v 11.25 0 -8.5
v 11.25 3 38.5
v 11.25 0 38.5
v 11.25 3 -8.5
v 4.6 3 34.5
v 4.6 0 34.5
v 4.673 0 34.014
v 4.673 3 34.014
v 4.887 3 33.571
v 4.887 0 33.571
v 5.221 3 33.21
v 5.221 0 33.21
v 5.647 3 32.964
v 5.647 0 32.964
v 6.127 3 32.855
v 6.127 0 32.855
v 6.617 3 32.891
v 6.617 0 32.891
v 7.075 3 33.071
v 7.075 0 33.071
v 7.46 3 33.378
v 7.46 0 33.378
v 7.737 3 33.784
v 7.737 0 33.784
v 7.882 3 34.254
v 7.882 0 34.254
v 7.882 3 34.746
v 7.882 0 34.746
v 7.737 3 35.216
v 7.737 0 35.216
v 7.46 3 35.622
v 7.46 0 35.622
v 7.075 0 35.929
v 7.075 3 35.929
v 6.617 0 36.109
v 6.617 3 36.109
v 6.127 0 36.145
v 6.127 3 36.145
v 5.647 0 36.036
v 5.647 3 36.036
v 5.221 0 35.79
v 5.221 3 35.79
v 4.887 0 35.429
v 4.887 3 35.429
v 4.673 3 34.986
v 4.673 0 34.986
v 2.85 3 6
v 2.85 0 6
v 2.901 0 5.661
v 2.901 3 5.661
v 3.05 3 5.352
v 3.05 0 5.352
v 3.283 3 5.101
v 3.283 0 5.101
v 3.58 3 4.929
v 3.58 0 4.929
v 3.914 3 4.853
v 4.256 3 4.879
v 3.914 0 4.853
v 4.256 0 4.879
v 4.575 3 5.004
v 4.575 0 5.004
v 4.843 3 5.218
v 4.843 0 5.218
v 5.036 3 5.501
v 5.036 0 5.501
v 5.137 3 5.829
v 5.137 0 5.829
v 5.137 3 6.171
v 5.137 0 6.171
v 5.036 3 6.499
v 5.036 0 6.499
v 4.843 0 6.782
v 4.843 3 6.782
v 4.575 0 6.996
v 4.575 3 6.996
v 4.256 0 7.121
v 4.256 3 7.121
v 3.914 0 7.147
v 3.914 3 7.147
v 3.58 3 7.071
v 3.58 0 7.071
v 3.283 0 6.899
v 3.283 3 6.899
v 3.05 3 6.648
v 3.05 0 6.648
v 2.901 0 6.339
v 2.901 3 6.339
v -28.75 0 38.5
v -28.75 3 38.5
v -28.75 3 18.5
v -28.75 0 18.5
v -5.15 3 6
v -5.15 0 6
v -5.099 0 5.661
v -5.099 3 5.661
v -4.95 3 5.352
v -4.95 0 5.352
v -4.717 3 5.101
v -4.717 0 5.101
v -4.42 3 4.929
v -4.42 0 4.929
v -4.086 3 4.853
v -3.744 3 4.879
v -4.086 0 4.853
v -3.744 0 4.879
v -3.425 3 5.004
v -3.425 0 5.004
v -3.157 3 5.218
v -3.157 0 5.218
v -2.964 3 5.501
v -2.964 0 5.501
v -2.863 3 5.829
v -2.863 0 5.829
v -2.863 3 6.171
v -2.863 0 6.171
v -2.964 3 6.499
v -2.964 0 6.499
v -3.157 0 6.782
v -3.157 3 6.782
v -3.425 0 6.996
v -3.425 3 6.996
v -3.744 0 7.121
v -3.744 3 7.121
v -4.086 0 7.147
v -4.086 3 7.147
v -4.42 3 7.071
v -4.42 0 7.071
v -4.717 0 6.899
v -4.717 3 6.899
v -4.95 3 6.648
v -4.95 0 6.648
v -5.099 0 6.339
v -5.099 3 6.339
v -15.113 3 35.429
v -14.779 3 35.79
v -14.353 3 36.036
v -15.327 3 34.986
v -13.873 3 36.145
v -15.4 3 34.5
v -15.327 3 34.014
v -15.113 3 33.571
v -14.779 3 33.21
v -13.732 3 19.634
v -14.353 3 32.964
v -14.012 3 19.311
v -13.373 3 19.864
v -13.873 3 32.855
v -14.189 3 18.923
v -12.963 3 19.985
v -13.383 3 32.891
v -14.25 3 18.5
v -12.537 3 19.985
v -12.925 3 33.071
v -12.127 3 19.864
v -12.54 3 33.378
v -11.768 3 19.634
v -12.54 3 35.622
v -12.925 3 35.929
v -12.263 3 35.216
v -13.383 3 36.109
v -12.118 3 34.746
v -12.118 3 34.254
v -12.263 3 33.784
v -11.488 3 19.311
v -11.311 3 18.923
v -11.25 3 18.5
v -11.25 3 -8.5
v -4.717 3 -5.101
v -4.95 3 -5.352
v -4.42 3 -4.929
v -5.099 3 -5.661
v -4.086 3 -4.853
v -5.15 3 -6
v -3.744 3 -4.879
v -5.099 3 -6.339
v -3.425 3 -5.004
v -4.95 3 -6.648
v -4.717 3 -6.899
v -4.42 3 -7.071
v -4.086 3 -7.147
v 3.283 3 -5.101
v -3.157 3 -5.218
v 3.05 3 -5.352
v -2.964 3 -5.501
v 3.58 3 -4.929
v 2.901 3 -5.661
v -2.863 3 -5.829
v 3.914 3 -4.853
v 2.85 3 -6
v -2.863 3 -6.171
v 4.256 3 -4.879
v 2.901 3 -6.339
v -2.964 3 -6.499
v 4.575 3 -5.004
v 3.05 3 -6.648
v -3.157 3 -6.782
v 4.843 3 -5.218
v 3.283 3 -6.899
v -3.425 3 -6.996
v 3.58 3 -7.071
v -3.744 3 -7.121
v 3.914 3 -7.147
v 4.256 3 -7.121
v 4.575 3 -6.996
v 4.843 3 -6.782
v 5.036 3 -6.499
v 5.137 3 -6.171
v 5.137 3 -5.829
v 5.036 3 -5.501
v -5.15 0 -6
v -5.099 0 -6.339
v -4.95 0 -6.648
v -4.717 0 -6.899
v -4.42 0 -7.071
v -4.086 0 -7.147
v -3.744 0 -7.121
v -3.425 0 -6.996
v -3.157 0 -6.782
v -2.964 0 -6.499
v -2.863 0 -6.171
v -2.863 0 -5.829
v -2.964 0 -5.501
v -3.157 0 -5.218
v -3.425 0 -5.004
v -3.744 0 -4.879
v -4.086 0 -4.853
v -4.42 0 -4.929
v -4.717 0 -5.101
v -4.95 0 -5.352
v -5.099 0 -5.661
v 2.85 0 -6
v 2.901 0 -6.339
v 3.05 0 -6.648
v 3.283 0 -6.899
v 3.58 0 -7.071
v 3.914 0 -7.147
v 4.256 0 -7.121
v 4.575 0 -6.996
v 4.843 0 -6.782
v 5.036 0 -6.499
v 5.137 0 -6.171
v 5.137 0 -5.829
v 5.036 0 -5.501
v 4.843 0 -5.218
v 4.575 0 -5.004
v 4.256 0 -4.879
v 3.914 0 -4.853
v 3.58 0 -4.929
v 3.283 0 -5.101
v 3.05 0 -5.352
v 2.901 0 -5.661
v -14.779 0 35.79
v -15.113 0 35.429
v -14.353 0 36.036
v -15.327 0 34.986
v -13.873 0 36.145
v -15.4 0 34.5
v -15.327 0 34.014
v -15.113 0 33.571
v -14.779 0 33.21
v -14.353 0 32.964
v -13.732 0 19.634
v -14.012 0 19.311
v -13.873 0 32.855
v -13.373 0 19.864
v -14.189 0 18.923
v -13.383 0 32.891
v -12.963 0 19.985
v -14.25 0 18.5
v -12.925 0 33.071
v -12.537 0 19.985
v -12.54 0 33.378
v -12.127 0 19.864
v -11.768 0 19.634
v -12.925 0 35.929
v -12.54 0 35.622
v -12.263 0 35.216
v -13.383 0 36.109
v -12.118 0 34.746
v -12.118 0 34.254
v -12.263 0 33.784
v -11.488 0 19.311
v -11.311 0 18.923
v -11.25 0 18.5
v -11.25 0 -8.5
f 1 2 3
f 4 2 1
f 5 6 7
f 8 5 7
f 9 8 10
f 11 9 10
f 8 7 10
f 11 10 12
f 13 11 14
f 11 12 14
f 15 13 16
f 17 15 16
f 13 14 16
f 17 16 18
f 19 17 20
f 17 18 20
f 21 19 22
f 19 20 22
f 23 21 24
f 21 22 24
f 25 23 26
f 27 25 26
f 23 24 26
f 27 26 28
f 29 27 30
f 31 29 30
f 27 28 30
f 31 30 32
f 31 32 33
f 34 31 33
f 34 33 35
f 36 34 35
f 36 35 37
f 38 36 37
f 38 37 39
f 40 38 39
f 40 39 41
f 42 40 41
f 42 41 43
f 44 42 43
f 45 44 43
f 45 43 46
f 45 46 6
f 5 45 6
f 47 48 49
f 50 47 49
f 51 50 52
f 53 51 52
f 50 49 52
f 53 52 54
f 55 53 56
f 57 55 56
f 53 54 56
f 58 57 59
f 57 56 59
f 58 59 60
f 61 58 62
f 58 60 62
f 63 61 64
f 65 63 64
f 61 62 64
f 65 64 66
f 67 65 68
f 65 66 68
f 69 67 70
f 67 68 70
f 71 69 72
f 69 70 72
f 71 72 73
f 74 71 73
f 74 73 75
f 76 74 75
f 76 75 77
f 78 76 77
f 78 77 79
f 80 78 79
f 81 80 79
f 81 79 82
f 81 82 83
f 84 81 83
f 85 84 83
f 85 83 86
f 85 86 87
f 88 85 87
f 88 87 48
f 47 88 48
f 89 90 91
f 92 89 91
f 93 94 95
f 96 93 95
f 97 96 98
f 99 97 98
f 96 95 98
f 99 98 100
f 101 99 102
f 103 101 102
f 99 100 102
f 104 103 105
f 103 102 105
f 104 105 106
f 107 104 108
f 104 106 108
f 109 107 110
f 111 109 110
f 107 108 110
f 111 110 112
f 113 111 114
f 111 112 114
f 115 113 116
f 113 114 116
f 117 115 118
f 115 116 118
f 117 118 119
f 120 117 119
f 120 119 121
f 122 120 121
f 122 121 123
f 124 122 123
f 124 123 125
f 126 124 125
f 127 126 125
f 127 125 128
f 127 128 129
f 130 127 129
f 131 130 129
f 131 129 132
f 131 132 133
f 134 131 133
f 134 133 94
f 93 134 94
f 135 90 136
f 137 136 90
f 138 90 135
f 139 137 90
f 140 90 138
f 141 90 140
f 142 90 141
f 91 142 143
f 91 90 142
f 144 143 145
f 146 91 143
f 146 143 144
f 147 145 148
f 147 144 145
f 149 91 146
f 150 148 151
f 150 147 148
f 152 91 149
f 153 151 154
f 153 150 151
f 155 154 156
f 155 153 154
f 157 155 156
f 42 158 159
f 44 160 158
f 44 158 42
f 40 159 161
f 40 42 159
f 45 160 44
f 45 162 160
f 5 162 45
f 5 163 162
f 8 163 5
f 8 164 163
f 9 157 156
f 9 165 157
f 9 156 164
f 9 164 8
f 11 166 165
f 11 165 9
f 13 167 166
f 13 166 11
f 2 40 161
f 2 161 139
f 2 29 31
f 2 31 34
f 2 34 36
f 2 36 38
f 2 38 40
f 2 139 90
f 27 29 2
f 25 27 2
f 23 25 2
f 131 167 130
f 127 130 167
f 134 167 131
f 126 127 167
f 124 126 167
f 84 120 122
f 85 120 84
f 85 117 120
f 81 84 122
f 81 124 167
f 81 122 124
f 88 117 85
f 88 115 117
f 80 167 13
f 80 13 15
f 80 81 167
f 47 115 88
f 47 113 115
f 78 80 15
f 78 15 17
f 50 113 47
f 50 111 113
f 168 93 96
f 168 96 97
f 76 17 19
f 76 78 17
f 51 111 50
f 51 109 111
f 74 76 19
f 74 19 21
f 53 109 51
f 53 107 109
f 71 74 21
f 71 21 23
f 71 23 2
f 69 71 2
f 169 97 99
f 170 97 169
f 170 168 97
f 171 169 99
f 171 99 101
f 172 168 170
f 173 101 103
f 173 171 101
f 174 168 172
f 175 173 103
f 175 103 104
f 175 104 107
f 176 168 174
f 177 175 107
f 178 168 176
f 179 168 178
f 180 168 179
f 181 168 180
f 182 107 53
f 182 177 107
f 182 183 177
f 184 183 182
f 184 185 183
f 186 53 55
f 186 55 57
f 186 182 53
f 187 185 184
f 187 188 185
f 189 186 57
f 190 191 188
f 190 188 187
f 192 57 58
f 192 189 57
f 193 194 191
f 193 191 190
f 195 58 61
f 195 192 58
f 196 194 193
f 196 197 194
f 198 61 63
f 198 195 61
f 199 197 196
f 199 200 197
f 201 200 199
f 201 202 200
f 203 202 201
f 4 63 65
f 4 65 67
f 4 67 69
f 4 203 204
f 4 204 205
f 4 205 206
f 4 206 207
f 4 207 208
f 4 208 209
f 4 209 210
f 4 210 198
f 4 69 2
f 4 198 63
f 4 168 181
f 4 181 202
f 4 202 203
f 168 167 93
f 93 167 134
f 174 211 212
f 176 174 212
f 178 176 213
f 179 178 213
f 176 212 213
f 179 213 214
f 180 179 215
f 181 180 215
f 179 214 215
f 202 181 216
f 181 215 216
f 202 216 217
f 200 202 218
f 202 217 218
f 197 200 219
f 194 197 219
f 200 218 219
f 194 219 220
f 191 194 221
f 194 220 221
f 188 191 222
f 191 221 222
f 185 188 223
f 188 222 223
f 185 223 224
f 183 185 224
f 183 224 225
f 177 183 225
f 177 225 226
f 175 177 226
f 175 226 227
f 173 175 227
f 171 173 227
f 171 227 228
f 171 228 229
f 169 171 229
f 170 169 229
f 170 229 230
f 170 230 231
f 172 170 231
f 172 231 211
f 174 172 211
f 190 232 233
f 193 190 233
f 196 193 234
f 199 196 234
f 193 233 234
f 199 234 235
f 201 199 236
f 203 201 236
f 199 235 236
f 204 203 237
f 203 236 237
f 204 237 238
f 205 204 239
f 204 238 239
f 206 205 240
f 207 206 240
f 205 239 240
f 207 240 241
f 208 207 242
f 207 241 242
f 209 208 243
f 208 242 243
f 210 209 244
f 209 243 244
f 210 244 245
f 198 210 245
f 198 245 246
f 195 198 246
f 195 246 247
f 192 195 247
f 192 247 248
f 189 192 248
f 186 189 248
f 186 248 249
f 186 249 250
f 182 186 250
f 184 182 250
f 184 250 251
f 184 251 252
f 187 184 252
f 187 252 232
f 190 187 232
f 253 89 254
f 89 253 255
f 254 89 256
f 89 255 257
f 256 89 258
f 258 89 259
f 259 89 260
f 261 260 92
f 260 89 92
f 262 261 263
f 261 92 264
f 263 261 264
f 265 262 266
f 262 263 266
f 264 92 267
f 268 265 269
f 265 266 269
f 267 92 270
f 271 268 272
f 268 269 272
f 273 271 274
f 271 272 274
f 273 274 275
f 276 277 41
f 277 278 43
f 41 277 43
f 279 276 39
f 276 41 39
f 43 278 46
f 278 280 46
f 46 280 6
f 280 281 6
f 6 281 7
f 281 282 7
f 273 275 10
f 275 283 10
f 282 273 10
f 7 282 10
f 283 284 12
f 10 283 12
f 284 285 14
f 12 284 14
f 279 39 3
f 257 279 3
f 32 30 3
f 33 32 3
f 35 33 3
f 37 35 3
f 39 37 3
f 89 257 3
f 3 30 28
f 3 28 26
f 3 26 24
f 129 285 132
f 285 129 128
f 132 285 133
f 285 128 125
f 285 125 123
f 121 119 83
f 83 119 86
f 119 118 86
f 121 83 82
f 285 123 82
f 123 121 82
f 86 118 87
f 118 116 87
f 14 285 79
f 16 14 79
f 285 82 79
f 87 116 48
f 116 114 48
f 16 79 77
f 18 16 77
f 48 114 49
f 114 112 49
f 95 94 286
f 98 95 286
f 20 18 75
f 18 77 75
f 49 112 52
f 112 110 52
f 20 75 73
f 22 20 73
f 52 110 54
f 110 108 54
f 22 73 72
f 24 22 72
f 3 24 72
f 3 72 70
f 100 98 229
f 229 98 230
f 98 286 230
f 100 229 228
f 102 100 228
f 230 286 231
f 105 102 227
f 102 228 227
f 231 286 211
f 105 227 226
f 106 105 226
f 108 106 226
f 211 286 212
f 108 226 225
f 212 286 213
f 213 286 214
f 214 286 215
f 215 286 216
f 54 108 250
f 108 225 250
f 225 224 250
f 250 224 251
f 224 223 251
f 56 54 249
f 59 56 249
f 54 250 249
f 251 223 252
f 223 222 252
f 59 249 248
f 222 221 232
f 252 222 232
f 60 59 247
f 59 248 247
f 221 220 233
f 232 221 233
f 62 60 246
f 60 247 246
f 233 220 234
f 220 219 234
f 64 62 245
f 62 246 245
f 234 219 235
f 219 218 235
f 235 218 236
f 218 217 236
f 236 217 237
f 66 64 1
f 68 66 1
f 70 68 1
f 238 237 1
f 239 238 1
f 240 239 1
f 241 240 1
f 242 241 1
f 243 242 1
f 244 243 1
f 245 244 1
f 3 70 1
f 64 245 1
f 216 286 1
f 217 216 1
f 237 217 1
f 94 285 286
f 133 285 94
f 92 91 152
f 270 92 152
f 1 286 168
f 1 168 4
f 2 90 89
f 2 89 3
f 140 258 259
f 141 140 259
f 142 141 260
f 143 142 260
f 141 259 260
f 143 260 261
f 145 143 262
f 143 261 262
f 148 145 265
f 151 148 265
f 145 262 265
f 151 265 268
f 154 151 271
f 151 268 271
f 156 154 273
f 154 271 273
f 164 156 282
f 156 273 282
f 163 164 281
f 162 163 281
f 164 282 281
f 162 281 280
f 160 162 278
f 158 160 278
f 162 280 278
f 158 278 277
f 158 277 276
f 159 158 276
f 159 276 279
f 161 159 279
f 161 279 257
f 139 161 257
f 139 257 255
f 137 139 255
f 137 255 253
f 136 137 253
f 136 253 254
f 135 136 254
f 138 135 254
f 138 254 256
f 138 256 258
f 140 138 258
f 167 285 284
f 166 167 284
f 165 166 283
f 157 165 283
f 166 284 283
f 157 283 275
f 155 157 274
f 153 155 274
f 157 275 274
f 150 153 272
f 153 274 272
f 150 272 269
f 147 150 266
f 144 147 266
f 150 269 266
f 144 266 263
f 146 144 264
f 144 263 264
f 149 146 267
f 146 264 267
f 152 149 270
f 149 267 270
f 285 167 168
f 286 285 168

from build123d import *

# Parameters (mm, degrees)
SKETCH_1_W      = 22.5
SKETCH_1_H      = 17
EXTRUDE_1_DEPTH = 3
HOLE_WIZARD_1_D = 2.3
SKETCH_5_W      = 22.5
SKETCH_5_H      = 30
EXTRUDE_2_DEPTH = 3
SKETCH_6_W      = 17.5
SKETCH_6_H      = 20
EXTRUDE_3_DEPTH = 3
HOLE_WIZARD_2_D = 3.3
HOLE_WIZARD_3_D = 3


with BuildPart() as part:
    # 草图1 → 凸台-拉伸1 (new body)
    with BuildSketch(Plane(origin=(0, 0, 0), x_dir=(1, 0, 0), z_dir=(0, 1, 0))):
        Rectangle(SKETCH_1_W, SKETCH_1_H)
    extrude(amount=EXTRUDE_1_DEPTH)

    # 孔1 (through all)
    with Locations(Plane(origin=(0, 3, 0), x_dir=(1, 0, 0), z_dir=(0, 1, 0))):
        with Locations((-4, 6), (4, 6), (-4, -6), (4, -6)):
            Hole(HOLE_WIZARD_1_D / 2)

    # 草图5 → 凸台-拉伸2 (add)
    with BuildSketch(Plane(origin=(0, 3, 0), x_dir=(1, 0, 0), z_dir=(0, 1, 0))):
        with Locations((0, -23.5)):
            Rectangle(SKETCH_5_W, SKETCH_5_H)
    extrude(amount=-EXTRUDE_2_DEPTH)

    # 草图6 → 凸台-拉伸3 (add)
    with BuildSketch(Plane(origin=(0, 3, 0), x_dir=(1, 0, 0), z_dir=(0, 1, 0))):
        with Locations((-20, -28.5)):
            Rectangle(SKETCH_6_W, SKETCH_6_H)
    extrude(amount=-EXTRUDE_3_DEPTH)

    # 孔2 (through all)
    with Locations(Plane(origin=(0, 3, 0), x_dir=(1, 0, 0), z_dir=(0, 1, 0))):
        with Locations((6.25, -34.5), (6.25, -54.5), (-13.75, -54.5), (-13.75, -34.5)):
            Hole(HOLE_WIZARD_2_D / 2)

    # 孔3 (through all)
    with Locations(Plane(origin=(0, 3, 0), x_dir=(1, 0, 0), z_dir=(0, 1, 0))):
        with Locations((-12.75, -18.5)):
            Hole(HOLE_WIZARD_3_D / 2)


solid = part.part
